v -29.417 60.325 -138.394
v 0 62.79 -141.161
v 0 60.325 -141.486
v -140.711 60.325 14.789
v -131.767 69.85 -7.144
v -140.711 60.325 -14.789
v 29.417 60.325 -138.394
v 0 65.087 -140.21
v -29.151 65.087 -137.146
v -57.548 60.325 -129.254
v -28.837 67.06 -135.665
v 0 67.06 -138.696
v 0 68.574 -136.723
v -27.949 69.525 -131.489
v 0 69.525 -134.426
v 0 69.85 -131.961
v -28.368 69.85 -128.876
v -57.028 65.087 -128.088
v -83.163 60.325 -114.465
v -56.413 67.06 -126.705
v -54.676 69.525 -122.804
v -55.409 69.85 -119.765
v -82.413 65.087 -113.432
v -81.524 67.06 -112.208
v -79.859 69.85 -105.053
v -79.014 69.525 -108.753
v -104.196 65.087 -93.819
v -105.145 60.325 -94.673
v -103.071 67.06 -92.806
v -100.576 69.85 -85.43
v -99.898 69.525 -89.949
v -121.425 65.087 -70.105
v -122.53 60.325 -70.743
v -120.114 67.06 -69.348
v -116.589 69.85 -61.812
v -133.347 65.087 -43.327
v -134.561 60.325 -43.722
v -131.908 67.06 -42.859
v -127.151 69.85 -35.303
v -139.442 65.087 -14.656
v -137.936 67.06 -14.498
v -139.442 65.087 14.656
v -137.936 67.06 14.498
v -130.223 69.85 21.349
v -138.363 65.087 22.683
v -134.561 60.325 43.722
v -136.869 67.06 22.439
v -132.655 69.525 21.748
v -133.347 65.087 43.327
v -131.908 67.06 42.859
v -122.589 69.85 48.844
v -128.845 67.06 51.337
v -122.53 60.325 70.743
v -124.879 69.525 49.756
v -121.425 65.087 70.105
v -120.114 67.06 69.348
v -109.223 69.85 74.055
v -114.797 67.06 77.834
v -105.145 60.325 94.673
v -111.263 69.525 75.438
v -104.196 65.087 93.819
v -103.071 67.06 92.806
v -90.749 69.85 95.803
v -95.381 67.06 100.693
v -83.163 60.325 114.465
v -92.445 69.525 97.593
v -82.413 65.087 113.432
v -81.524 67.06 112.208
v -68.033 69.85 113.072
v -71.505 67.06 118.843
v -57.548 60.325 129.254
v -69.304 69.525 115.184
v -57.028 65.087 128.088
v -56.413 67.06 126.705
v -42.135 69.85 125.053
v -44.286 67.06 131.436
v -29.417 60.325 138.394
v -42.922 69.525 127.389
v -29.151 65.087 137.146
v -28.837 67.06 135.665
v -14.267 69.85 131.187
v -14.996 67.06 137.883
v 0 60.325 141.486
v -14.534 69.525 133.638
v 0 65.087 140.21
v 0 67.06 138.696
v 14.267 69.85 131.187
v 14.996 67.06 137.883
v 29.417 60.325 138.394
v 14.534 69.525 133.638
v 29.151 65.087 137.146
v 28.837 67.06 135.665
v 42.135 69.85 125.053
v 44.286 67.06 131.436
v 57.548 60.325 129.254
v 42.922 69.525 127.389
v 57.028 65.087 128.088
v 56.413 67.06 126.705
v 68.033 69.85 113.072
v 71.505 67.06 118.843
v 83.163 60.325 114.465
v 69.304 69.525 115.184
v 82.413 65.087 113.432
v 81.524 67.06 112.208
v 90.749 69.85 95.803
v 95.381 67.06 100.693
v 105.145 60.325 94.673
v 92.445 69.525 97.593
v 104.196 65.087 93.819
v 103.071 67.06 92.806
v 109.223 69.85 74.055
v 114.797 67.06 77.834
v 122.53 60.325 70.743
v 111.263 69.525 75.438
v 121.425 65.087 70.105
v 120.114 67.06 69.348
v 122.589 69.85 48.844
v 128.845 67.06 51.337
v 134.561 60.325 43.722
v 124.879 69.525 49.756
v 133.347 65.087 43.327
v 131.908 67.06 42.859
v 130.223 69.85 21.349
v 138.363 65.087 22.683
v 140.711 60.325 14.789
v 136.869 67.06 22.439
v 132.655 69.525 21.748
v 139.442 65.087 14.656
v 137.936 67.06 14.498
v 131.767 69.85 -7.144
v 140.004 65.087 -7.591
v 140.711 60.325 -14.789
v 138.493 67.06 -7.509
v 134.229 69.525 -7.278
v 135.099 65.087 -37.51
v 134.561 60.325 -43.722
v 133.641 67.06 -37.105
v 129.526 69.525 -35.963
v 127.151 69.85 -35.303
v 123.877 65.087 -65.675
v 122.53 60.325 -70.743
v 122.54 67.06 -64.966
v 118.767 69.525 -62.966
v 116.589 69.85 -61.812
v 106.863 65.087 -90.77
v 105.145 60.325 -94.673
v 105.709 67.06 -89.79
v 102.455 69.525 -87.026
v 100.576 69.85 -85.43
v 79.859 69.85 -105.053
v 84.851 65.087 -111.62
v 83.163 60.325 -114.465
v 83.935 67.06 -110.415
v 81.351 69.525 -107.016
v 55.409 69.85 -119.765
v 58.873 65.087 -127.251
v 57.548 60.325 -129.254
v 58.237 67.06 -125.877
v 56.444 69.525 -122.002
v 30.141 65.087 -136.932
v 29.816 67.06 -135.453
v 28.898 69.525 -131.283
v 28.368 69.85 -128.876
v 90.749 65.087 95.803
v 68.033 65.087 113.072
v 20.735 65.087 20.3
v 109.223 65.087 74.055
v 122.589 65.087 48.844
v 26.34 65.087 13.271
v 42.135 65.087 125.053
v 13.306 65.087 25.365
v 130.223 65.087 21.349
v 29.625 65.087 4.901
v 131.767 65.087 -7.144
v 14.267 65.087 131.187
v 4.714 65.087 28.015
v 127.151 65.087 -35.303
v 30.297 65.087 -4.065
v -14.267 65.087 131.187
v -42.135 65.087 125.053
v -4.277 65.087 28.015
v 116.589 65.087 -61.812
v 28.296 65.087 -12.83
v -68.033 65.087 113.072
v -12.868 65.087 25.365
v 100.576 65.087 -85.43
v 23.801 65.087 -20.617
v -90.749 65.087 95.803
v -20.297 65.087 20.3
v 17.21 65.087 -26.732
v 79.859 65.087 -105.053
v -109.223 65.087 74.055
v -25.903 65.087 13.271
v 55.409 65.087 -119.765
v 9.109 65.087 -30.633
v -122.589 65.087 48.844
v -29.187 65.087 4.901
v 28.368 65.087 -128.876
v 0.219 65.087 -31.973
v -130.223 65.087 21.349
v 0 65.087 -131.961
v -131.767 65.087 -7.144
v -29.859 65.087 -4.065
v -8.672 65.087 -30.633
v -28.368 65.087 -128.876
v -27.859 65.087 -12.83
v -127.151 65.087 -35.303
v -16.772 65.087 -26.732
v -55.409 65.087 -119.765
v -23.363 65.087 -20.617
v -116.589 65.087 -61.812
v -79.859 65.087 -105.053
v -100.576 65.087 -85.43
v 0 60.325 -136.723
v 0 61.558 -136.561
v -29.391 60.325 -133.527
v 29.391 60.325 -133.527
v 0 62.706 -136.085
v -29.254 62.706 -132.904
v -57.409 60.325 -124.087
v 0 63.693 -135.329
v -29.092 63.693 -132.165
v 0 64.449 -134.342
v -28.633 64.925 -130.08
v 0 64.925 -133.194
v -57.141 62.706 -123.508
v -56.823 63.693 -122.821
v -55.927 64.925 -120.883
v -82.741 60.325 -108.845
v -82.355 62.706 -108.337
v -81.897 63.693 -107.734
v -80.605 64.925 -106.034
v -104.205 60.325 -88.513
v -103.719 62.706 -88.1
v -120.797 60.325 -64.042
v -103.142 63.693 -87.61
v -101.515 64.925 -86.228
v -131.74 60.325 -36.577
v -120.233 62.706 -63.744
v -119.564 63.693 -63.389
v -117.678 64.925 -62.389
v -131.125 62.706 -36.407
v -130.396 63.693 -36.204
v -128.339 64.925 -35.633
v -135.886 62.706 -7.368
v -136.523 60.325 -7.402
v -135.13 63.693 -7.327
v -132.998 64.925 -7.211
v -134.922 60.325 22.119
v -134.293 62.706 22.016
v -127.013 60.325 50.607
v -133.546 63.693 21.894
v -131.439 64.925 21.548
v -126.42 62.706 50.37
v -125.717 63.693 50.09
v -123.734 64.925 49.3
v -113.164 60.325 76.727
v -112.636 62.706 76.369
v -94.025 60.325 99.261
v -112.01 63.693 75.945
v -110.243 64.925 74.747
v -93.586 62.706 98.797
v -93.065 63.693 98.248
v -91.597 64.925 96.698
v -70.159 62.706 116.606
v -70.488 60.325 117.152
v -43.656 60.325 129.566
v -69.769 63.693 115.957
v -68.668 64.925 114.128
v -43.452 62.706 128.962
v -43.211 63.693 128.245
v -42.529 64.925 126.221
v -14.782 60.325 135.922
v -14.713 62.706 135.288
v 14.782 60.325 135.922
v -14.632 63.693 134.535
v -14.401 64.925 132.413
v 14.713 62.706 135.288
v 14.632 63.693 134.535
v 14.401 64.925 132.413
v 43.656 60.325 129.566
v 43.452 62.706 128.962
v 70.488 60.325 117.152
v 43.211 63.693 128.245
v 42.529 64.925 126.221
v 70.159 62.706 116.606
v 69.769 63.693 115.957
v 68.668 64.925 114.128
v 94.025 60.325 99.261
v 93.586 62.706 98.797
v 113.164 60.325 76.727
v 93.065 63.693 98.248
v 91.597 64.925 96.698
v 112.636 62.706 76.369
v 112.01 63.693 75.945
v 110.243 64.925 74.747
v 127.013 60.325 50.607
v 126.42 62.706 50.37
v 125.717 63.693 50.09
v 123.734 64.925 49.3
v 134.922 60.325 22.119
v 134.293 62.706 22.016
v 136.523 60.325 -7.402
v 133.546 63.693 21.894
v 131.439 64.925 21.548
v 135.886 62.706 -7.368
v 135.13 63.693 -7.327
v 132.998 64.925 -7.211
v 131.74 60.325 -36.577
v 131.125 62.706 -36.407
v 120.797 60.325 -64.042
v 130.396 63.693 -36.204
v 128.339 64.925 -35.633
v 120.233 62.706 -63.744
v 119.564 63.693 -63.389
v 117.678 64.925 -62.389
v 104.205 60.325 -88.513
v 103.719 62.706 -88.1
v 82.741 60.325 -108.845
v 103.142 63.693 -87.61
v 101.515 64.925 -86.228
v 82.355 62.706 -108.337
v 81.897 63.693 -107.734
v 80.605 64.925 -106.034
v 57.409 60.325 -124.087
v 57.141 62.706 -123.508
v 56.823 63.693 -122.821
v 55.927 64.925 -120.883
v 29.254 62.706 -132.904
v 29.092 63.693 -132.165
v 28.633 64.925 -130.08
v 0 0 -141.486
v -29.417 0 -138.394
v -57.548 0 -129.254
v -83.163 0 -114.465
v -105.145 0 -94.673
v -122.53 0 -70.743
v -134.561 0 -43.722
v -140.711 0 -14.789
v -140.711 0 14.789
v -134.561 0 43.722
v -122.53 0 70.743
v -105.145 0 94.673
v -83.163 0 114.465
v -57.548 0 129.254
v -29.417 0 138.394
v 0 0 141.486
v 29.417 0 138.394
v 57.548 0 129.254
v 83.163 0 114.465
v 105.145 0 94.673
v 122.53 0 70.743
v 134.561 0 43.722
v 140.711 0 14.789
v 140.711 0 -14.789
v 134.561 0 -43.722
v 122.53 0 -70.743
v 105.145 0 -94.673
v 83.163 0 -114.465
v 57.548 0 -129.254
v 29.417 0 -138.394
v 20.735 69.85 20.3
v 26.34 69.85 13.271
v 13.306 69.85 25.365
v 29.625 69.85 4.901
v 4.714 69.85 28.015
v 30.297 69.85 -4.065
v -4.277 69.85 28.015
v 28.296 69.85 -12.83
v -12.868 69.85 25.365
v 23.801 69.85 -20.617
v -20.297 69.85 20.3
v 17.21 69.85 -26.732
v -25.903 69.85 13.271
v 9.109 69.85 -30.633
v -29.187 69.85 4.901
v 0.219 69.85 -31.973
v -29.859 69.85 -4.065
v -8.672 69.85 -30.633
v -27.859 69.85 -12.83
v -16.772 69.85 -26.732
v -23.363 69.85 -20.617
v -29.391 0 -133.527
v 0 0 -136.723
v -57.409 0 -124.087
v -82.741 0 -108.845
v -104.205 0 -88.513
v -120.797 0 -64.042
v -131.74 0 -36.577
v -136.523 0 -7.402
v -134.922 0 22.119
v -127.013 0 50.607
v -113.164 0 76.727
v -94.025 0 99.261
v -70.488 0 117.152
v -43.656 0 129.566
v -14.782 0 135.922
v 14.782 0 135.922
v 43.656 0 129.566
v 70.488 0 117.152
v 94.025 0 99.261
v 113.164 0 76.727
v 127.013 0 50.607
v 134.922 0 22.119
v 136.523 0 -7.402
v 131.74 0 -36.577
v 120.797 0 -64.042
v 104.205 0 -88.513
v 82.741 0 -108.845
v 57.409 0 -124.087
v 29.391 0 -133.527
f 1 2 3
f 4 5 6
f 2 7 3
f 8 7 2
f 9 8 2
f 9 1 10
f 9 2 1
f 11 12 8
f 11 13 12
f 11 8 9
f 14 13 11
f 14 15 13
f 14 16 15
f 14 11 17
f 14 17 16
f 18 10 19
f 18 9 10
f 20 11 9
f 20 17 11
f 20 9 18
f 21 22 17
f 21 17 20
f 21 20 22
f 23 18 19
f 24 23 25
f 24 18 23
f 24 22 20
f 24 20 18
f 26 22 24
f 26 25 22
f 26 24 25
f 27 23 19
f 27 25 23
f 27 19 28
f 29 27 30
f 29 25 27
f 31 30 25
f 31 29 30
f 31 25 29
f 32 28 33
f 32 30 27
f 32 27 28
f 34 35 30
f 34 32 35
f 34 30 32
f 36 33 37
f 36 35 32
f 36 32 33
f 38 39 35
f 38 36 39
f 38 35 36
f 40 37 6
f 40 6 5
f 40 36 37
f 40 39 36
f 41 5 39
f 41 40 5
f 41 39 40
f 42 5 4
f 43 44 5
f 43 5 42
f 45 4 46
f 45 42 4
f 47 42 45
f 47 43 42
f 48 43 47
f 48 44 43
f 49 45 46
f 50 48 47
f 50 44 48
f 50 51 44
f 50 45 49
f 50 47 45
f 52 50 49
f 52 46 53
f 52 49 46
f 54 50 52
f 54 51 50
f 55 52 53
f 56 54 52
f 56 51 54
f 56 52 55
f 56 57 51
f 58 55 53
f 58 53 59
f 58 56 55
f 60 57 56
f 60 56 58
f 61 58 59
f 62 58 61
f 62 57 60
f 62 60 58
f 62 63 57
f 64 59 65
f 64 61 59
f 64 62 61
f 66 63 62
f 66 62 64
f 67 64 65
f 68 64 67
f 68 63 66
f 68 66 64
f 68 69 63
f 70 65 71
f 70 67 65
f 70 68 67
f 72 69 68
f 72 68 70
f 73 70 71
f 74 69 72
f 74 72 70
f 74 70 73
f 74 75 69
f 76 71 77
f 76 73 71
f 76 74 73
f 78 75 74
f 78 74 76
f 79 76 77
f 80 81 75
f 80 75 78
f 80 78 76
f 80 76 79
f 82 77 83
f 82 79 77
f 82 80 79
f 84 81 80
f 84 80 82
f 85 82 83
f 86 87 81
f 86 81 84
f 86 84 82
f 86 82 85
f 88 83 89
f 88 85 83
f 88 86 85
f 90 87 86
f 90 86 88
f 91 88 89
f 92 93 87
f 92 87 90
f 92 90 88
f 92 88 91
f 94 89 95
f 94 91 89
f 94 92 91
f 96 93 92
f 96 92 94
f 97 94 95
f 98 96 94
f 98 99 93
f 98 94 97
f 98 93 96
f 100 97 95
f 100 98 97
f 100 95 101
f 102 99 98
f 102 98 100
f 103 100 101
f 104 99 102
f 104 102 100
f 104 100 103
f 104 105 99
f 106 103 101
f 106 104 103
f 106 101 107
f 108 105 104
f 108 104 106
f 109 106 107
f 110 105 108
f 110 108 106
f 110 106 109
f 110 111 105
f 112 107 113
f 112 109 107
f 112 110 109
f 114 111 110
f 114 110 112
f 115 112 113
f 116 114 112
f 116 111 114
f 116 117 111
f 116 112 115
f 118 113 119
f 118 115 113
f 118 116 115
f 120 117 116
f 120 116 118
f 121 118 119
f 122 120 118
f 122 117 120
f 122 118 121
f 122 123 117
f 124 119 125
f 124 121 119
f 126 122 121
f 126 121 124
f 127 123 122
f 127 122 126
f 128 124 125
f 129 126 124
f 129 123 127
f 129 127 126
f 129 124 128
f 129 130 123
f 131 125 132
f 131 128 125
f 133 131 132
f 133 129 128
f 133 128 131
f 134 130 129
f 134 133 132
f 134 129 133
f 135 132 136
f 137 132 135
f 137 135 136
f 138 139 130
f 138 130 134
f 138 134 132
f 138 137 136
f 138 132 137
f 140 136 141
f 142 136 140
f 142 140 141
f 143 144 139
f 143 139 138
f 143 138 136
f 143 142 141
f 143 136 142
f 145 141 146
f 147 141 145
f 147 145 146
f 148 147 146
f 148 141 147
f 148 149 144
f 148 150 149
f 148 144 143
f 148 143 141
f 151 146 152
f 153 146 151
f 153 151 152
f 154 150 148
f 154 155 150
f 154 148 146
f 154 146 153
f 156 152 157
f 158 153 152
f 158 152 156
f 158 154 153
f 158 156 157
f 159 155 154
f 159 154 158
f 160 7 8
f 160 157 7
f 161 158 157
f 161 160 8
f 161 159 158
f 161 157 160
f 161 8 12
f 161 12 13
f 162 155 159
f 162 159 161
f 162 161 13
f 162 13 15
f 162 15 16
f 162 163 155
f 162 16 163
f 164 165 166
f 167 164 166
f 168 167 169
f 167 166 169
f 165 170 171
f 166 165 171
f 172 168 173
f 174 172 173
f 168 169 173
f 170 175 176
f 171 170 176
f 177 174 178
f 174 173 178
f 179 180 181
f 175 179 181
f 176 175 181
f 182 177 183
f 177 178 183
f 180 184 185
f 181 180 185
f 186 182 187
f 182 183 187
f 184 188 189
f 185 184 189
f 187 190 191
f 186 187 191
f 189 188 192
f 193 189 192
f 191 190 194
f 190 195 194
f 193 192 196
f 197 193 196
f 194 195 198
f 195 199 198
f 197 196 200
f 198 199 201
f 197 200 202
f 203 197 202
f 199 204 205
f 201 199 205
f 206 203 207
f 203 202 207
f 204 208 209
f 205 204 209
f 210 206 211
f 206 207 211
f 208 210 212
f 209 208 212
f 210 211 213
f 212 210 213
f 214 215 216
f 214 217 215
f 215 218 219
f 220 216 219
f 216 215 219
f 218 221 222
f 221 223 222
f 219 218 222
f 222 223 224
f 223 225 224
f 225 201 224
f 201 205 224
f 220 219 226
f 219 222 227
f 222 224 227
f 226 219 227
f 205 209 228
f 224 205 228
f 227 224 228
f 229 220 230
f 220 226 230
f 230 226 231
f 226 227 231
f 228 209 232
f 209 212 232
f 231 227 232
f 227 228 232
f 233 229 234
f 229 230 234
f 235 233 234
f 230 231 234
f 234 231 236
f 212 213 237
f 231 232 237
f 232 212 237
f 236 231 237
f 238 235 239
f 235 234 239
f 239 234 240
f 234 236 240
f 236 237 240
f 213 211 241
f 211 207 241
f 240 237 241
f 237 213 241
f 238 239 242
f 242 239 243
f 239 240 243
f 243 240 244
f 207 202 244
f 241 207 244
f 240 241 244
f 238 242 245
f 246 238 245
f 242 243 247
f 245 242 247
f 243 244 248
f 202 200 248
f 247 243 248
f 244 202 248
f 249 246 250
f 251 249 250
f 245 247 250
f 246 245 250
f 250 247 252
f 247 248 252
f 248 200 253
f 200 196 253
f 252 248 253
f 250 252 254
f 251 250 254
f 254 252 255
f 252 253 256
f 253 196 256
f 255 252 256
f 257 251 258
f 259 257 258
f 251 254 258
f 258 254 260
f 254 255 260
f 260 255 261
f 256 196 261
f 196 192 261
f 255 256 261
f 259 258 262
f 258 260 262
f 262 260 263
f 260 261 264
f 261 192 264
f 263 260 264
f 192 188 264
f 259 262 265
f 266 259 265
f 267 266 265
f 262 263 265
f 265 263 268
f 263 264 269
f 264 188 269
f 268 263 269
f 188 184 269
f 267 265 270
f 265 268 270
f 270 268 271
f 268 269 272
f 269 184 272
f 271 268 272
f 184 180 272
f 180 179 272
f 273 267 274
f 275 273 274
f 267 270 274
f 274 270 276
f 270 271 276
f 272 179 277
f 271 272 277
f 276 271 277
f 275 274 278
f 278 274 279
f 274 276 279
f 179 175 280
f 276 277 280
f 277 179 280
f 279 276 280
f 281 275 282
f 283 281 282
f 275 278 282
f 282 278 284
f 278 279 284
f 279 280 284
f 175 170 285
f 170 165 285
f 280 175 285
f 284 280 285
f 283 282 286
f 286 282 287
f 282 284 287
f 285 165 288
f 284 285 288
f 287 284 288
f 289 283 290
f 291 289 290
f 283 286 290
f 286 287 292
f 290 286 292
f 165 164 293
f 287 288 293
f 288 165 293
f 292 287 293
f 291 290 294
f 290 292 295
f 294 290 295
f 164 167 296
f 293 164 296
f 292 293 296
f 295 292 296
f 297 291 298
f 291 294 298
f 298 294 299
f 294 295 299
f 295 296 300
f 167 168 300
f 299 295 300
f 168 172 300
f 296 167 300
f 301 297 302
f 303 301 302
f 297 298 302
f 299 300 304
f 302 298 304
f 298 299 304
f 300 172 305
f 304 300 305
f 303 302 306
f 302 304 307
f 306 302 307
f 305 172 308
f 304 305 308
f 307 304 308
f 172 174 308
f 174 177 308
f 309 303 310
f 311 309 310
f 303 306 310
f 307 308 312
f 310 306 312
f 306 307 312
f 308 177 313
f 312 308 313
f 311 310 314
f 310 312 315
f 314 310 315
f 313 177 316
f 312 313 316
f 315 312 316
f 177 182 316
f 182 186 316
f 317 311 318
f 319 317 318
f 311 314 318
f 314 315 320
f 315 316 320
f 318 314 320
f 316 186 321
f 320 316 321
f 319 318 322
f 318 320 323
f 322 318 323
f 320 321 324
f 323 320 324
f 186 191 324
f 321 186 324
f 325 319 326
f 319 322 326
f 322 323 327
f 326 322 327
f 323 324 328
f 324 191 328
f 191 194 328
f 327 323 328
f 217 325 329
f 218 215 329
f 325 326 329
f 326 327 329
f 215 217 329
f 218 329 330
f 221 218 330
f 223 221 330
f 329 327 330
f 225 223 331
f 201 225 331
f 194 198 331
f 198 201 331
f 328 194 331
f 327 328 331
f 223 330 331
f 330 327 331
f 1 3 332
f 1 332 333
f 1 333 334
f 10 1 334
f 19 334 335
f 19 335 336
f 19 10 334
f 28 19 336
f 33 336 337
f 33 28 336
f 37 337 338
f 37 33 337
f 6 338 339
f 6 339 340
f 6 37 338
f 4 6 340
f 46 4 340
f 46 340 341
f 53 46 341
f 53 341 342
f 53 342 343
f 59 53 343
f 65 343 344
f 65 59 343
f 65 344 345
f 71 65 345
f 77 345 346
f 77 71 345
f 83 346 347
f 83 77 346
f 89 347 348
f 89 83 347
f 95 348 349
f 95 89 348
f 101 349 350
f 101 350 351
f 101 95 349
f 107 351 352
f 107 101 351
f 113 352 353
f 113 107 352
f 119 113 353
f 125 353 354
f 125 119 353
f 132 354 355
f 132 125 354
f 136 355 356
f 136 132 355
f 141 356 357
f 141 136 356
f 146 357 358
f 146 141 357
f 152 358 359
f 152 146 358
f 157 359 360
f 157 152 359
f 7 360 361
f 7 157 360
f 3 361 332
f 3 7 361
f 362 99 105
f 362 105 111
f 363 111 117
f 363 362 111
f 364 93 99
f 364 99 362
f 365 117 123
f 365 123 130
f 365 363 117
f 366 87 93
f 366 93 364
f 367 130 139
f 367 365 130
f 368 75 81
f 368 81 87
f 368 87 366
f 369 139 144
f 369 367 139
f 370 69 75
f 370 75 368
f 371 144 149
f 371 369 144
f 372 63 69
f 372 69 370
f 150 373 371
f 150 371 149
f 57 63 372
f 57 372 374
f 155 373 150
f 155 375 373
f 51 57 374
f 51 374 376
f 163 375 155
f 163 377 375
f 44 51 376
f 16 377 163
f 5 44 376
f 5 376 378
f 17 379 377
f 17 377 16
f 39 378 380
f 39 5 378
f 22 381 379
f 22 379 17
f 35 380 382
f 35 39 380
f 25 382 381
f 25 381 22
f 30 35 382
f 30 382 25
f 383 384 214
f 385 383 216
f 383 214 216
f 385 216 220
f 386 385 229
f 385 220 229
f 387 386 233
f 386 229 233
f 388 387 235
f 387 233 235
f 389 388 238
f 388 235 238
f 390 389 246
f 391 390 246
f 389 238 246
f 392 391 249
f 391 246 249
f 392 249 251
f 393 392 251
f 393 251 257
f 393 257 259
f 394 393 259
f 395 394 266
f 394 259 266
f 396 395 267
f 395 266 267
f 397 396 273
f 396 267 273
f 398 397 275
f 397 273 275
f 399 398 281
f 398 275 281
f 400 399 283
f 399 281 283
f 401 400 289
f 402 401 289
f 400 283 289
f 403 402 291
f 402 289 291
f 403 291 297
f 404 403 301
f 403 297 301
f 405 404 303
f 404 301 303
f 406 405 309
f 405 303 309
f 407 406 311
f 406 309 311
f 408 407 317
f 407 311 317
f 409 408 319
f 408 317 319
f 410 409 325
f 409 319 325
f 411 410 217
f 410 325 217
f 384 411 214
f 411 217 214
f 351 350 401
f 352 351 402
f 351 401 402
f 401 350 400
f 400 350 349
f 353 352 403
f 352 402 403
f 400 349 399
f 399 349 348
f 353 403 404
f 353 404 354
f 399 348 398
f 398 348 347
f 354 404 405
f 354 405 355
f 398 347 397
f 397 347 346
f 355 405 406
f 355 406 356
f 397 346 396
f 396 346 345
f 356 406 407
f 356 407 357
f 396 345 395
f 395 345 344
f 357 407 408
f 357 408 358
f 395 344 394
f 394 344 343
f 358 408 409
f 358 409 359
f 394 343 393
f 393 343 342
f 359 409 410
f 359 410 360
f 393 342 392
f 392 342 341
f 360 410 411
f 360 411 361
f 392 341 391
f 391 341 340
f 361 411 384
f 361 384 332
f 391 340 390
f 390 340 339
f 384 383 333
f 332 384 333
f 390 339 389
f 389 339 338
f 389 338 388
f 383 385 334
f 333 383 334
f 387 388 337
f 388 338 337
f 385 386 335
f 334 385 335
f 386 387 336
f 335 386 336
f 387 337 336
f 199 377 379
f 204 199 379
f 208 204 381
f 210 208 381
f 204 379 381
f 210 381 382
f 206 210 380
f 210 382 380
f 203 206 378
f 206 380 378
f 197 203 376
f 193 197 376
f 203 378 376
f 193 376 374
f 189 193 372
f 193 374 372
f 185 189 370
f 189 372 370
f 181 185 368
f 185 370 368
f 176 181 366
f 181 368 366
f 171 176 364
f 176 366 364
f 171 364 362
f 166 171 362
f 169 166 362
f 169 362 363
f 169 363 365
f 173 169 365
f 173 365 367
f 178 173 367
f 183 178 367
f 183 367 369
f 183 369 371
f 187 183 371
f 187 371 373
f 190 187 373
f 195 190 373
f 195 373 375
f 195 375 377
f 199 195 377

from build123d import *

# Parameters (mm, degrees)
SKETCH1_W               = 141.4859375
SKETCH1_H               = 69.85
FILLET1_R               = 9.525
SHELL1_T                = -4.7625
SKETCH3_R               = 30.1625
CUT_EXTRUDE1_DEPTH      = 30.734
CUT_EXTRUDE1_DEPTH_BACK = 28.194


with BuildPart() as part:
    # Sketch1 → Revolve1 (revolve)
    with BuildSketch(Plane(origin=(0, 0, 0), x_dir=(0, 0, -1), z_dir=(1, 0, 0)), mode=Mode.PRIVATE) as revolve1_sk:
        with Locations((-70.74296875, 34.925)):
            Rectangle(SKETCH1_W, SKETCH1_H)
    revolve(revolve1_sk.sketch.rotate(Axis((0, 0, 0), (0, 1, 0)), 180), axis=Axis((0, 0, 0), (0, 1, 0)))

    # Fillet1
    fillet1_edges = [part.edges().sort_by_distance(p)[0] for p in [
        (0, 69.85, 141.4859375),
    ]]
    fillet(fillet1_edges, radius=FILLET1_R)

    # Shell1
    shell1_openings = [part.faces().sort_by_distance(p)[0] for p in [
        (0, 0, 0),
    ]]
    offset(amount=SHELL1_T, openings=shell1_openings, kind=Kind.INTERSECTION)

    # Sketch3 → Cut-Extrude1 (cut, two sides)
    with BuildSketch(Plane(origin=(0, 69.85, 0), x_dir=(1, 0, 0), z_dir=(0, 1, 0))) as cut_extrude1_sk:
        with Locations(Location((0.218944766, 1.810655032, 0), (0, 0, 90))):
            Circle(SKETCH3_R)
    extrude(amount=CUT_EXTRUDE1_DEPTH, mode=Mode.SUBTRACT)
    extrude(cut_extrude1_sk.sketch, amount=-CUT_EXTRUDE1_DEPTH_BACK, mode=Mode.SUBTRACT)


solid = part.part
